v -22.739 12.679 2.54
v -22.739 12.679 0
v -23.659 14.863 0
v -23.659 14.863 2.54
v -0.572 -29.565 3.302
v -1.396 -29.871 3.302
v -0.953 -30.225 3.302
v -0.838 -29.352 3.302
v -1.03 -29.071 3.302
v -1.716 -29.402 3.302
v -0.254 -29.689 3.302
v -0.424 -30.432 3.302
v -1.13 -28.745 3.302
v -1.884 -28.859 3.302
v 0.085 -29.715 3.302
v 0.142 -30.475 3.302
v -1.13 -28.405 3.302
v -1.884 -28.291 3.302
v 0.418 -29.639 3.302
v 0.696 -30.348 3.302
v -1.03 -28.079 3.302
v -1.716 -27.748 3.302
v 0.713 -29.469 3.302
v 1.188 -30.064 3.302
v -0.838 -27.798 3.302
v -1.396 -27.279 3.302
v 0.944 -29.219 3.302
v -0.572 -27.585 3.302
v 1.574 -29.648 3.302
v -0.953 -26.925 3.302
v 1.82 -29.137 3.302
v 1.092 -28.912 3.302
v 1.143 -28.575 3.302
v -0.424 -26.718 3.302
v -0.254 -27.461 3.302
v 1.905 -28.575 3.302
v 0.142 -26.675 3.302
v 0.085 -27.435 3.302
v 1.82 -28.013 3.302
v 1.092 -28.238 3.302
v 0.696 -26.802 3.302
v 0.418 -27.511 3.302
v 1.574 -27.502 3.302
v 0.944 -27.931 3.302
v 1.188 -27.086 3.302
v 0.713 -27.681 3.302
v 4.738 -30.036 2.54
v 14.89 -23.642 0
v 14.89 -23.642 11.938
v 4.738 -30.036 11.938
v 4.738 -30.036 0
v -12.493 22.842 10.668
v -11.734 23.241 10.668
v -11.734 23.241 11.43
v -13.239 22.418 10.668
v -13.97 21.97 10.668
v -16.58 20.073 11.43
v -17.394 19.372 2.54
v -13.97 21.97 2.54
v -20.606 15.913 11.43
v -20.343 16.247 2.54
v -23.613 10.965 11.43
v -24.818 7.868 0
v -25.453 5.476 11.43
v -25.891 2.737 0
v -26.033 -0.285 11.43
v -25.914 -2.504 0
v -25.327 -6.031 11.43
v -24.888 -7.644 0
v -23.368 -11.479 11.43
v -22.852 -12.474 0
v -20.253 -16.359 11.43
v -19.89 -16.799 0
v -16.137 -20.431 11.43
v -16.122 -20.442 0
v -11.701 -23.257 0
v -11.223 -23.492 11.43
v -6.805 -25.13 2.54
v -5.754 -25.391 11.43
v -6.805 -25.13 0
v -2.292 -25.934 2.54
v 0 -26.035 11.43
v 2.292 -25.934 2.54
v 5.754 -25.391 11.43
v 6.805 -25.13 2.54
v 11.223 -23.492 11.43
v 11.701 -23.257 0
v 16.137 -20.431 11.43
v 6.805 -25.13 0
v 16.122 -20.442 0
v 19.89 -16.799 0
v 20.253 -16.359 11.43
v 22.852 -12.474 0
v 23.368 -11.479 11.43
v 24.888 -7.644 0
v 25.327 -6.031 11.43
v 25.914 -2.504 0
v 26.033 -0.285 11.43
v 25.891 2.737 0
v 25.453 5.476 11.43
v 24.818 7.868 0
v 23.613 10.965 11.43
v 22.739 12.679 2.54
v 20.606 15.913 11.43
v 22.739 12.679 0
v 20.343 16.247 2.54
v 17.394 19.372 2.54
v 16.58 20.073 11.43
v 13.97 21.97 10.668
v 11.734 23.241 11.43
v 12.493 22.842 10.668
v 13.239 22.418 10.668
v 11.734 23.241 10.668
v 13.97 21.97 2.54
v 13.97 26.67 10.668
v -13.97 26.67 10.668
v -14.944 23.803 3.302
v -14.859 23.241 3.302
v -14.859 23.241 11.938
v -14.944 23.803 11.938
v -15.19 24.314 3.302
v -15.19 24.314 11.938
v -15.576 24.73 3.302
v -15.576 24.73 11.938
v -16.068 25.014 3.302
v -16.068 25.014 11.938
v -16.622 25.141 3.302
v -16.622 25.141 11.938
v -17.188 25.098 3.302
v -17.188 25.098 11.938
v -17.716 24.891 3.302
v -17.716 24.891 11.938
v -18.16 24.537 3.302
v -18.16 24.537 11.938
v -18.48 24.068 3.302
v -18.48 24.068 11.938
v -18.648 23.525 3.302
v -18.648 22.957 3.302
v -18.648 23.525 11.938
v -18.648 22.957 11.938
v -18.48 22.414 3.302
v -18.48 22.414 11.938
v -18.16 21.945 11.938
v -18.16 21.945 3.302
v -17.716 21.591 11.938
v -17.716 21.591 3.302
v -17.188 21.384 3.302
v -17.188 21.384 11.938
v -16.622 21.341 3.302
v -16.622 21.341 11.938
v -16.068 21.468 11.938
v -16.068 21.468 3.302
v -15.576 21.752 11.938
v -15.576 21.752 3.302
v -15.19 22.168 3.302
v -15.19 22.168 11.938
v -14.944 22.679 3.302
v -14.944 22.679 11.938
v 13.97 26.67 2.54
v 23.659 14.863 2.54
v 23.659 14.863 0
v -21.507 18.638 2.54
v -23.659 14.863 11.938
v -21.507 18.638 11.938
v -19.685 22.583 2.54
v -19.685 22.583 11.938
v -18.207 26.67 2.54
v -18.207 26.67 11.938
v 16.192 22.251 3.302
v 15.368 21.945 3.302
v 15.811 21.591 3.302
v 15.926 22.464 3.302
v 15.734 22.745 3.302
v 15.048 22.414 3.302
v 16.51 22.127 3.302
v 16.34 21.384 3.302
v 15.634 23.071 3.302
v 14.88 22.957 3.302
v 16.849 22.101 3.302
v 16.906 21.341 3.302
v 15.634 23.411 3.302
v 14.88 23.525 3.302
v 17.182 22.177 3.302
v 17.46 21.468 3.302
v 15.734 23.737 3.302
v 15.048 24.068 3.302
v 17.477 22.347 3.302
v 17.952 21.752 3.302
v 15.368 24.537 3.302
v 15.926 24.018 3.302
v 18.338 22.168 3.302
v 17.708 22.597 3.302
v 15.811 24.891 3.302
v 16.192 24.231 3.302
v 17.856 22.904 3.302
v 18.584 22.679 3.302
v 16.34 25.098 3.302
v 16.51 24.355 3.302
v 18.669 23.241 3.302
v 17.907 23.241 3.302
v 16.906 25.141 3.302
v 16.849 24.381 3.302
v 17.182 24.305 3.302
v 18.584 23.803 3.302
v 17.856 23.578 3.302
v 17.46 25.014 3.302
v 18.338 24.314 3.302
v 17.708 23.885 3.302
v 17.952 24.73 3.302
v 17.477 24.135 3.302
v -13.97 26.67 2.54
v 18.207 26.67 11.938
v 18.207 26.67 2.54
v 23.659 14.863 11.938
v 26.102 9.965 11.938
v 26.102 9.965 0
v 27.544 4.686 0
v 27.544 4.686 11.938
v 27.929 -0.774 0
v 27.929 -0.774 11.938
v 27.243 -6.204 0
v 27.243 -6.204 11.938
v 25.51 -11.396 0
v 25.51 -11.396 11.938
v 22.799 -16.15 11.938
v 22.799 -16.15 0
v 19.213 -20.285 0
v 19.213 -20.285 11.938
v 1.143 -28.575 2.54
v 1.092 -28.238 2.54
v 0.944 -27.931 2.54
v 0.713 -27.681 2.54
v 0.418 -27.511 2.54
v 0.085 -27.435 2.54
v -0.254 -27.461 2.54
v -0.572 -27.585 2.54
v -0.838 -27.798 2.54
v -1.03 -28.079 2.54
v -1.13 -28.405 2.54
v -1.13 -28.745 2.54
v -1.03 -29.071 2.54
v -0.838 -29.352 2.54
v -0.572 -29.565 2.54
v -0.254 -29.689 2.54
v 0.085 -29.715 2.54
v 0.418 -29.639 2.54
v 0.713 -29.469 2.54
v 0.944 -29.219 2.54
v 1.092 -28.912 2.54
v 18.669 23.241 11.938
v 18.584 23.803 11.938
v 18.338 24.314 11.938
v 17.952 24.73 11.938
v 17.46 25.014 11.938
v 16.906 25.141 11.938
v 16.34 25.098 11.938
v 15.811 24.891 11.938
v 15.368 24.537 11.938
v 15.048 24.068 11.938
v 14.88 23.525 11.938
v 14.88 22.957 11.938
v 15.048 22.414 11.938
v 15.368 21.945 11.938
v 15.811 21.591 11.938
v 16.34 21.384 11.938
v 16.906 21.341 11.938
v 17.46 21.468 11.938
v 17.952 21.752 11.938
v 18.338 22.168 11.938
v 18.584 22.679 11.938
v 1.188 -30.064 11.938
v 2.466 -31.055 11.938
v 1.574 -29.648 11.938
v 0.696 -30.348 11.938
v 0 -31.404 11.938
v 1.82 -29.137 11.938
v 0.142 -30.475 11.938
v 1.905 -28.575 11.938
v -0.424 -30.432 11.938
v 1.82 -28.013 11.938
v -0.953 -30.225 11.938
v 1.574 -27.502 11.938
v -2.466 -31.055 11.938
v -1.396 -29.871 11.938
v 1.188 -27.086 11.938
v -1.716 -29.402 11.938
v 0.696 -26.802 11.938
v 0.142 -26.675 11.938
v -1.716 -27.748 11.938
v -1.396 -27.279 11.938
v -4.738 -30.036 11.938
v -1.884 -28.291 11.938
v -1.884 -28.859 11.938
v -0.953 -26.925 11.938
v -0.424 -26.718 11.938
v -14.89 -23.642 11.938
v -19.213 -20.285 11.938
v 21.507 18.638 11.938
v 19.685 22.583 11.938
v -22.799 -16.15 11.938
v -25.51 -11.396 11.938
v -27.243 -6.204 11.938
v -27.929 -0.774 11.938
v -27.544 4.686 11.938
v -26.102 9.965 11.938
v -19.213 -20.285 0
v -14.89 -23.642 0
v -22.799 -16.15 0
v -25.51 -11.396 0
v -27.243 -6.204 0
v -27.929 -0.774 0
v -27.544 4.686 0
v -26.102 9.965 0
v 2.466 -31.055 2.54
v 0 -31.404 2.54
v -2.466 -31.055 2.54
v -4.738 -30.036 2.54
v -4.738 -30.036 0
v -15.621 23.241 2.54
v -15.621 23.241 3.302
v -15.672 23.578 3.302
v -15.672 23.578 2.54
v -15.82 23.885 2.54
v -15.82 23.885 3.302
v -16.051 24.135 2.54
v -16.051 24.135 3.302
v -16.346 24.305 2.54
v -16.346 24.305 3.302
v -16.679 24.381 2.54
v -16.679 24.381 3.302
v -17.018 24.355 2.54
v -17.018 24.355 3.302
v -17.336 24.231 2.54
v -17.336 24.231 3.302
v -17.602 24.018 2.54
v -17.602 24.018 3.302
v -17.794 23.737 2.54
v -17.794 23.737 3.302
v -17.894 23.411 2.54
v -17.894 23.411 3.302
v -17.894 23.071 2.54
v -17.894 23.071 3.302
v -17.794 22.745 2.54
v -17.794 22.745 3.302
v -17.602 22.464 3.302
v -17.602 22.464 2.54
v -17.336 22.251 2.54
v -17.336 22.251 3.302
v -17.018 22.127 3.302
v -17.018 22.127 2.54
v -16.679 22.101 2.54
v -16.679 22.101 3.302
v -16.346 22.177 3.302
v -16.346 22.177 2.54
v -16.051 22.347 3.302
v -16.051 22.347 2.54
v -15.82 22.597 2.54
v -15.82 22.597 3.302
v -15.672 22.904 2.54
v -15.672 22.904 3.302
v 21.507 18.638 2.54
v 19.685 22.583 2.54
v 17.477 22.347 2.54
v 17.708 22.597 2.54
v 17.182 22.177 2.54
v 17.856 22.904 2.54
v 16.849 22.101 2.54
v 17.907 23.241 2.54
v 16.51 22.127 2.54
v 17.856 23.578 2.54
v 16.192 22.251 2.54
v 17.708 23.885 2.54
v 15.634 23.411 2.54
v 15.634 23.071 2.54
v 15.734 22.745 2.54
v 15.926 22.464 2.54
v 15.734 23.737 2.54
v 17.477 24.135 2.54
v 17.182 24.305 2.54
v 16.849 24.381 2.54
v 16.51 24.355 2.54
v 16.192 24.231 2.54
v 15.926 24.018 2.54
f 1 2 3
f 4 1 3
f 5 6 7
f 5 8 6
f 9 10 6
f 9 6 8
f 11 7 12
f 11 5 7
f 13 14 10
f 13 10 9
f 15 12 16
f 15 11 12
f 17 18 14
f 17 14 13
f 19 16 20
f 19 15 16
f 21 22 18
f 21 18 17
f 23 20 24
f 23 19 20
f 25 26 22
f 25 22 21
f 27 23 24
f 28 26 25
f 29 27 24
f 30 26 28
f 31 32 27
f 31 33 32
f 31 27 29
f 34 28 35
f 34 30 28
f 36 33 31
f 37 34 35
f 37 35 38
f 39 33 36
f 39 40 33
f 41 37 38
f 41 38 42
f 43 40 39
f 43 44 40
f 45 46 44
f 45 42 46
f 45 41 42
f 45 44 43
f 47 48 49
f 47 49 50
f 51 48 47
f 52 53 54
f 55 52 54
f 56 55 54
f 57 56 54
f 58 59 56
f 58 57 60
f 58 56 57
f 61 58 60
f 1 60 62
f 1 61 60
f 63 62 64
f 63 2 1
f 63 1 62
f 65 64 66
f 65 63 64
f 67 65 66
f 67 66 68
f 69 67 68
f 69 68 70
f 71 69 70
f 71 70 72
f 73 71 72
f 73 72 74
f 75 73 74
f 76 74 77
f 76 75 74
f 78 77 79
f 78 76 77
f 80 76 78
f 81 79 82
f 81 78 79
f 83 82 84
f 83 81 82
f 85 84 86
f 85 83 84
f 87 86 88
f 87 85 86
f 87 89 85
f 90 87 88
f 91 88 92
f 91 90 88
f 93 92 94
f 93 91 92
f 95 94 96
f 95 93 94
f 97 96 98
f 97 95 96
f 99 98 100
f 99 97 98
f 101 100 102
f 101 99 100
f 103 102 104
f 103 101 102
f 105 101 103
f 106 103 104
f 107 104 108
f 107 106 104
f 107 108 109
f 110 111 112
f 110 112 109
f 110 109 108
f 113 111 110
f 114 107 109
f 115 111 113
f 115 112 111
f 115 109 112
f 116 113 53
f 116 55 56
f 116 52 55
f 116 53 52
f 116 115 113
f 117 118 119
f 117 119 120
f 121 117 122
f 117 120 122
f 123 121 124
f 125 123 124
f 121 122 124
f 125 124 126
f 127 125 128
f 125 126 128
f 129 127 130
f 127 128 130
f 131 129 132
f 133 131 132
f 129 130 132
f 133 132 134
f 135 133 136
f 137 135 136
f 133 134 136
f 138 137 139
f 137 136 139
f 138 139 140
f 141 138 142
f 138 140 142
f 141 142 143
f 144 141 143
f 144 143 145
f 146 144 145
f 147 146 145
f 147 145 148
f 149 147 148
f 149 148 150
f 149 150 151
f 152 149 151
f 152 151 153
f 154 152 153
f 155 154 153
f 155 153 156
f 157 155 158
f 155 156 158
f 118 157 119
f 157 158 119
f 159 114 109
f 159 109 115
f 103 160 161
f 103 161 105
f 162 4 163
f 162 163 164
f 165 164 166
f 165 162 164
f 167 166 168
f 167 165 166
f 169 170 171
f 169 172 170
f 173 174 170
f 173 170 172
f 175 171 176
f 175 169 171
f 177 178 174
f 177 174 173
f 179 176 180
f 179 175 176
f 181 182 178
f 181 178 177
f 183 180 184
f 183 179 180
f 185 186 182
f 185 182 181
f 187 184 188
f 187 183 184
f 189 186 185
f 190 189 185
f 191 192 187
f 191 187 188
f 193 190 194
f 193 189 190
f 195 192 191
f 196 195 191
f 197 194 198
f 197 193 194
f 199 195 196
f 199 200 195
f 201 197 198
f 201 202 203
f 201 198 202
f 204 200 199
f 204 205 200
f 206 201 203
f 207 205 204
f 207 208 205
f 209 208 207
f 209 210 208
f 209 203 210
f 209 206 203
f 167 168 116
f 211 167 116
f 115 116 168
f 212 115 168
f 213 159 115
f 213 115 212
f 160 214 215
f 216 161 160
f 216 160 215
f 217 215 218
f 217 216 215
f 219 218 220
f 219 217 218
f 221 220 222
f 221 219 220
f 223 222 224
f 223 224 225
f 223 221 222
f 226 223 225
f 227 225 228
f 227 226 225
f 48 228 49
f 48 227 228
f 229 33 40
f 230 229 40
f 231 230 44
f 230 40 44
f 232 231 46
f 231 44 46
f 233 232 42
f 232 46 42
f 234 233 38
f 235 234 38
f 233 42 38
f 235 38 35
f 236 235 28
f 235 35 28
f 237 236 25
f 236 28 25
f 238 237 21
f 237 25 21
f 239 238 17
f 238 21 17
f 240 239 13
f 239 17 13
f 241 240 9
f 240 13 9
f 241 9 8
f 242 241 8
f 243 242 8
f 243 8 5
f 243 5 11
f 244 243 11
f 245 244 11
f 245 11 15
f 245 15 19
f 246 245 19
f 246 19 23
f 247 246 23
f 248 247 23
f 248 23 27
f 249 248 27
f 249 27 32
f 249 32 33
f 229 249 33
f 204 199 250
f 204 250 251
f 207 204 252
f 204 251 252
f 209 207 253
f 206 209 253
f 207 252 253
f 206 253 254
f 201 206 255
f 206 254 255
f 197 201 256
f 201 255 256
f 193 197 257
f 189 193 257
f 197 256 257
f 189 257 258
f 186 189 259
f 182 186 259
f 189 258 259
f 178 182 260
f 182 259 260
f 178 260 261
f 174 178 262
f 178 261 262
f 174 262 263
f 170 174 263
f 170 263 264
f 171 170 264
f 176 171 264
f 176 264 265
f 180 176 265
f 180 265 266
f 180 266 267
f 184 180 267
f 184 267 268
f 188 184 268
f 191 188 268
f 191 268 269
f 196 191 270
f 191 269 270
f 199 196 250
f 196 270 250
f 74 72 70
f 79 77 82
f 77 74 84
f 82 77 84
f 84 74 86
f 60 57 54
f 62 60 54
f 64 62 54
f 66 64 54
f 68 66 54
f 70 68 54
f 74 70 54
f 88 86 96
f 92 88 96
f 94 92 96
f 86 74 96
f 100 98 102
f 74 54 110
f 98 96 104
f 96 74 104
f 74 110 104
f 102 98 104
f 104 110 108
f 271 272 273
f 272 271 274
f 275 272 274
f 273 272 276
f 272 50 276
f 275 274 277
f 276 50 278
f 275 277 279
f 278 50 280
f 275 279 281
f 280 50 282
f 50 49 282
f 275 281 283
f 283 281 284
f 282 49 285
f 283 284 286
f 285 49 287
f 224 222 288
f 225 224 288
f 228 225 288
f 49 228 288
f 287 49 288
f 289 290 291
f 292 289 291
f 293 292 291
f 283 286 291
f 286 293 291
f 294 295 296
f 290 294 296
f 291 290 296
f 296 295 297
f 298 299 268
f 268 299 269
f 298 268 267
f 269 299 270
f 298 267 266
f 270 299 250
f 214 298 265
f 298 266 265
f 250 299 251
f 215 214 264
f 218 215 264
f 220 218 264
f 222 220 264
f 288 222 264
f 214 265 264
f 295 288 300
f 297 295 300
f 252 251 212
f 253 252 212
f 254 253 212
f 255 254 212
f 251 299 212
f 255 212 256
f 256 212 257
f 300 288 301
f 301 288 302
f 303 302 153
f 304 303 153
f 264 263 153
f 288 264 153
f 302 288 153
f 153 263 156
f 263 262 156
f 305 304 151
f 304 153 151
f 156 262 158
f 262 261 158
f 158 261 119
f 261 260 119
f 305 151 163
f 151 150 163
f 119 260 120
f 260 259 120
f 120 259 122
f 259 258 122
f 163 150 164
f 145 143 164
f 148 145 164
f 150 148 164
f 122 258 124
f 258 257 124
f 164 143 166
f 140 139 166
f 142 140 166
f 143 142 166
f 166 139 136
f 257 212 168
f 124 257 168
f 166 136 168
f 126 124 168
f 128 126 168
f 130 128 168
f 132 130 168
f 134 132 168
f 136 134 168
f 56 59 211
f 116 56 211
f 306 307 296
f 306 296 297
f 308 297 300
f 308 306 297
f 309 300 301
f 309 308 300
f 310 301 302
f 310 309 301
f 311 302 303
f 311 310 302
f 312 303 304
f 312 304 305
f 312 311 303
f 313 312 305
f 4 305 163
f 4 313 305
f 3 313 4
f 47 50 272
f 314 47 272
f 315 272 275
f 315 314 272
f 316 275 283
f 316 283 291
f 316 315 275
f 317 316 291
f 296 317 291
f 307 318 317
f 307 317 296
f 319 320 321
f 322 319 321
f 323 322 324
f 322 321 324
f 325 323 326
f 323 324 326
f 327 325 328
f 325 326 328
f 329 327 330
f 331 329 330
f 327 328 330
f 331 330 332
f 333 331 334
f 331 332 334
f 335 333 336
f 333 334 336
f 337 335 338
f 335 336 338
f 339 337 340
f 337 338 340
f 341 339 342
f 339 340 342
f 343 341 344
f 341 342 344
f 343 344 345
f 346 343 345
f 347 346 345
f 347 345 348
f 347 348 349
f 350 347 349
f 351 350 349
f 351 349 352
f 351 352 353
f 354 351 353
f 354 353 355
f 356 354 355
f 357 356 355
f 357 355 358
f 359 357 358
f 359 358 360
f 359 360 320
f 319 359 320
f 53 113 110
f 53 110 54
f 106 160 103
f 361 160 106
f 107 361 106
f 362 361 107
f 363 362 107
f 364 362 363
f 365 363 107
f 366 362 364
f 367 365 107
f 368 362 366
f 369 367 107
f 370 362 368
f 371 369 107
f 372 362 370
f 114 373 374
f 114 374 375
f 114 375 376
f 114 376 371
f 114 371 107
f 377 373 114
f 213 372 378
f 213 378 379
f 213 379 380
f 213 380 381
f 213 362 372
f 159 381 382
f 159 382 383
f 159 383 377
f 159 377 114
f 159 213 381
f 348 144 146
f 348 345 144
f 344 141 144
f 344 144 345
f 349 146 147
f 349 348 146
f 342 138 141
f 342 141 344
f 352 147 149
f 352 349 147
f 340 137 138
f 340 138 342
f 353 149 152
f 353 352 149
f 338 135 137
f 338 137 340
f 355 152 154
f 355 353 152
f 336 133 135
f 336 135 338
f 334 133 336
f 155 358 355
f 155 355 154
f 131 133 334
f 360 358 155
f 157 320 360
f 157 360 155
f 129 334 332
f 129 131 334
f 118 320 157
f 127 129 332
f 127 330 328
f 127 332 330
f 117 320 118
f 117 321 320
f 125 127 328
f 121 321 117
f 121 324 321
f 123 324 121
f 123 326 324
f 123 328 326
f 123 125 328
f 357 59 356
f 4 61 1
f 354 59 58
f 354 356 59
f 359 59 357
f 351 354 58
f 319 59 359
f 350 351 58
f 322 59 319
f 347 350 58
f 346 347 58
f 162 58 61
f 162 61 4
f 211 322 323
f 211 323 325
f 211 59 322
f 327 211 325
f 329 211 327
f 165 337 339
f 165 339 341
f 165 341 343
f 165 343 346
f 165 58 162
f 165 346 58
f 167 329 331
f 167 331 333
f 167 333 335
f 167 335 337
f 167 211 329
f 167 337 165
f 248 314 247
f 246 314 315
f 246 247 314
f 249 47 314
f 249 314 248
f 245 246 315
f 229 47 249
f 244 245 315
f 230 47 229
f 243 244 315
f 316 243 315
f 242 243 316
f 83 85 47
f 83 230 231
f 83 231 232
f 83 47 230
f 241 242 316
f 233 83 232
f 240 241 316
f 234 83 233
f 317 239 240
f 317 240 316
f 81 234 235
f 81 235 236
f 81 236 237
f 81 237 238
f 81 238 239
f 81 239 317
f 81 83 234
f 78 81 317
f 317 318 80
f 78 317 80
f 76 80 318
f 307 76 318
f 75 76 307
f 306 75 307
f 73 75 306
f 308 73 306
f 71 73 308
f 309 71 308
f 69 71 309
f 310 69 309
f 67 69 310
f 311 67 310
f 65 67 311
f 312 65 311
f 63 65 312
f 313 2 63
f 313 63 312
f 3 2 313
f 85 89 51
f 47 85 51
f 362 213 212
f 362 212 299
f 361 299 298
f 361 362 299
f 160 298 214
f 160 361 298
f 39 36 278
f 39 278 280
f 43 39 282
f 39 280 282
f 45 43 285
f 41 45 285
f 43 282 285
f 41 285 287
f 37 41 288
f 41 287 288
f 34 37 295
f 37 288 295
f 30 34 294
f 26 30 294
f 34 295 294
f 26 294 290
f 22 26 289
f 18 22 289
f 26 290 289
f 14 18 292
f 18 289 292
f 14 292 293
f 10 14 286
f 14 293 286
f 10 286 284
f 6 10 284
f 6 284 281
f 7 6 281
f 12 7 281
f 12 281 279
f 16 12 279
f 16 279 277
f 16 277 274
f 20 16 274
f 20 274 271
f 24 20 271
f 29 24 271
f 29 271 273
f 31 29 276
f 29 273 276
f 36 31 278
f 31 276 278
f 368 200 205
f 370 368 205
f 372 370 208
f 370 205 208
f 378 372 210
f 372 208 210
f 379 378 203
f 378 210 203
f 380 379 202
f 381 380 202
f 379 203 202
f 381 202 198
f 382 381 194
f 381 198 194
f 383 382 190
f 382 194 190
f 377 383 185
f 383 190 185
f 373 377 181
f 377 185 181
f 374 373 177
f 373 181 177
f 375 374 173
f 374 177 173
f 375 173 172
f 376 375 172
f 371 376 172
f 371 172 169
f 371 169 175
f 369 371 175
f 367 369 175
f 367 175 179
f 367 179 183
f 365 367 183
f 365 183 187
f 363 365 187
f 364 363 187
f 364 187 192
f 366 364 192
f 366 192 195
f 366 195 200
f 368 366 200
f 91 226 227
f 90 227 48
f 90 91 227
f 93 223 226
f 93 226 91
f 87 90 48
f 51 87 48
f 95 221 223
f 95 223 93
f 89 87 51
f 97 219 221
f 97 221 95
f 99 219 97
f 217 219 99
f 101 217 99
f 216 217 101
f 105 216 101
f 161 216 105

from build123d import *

# Parameters (mm, degrees)
BOSS_EXTRUDE1_DEPTH = 11.938
CUT_EXTRUDE1_DEPTH  = 11.43
SKETCH3_W           = 27.94
SKETCH3_H           = 25.845942769
CUT_EXTRUDE2_DEPTH  = 10.668
SKETCH4_R           = 1.905
CUT_EXTRUDE3_DEPTH  = 8.636
SKETCH5_R           = 1.143
CUT_EXTRUDE4_DEPTH  = 21.59
CUT_EXTRUDE5_DEPTH  = 2.54


with BuildPart() as part:
    # Sketch1 → Boss-Extrude1 (new body)
    with BuildSketch(Plane.XY):
        with BuildLine():
            Line((-4.737825132, -30.035944056), (-14.890307558, -23.641538462))
            ThreePointArc((-14.890307558, -23.641538462), (-27.242520167, -6.203925768), (-23.658870968, 14.862752926))
            ThreePointArc((-23.658870968, 14.862752926), (-20.55370118, 20.591203739), (-18.20732863, 26.67))
            Line((-18.20732863, 26.67), (18.20732863, 26.67))
            ThreePointArc((18.20732863, 26.67), (20.55370118, 20.591203739), (23.658870968, 14.862752926))
            ThreePointArc((23.658870968, 14.862752926), (27.242520167, -6.203925768), (14.890307558, -23.641538462))
            Line((14.890307558, -23.641538462), (4.737825132, -30.035944056))
            ThreePointArc((4.737825132, -30.035944056), (0, -31.403636364), (-4.737825132, -30.035944056))
        make_face()
    extrude(amount=BOSS_EXTRUDE1_DEPTH)

    # Sketch2 → Cut-Extrude1 (cut)
    with BuildSketch(Plane(origin=(0, 0, 0), x_dir=(-1, 0, 0), z_dir=(0, 0, -1))):
        with BuildLine():
            Line((-11.733590414, 23.241), (11.733590414, 23.241))
            ThreePointArc((11.733590414, 23.241), (0, -26.035), (-11.733590414, 23.241))
        make_face()
    extrude(amount=-CUT_EXTRUDE1_DEPTH, mode=Mode.SUBTRACT)

    # Sketch3 → Cut-Extrude2 (cut)
    with BuildSketch(Plane(origin=(0, 0, 0), x_dir=(-1, 0, 0), z_dir=(0, 0, -1))):
        with Locations((0, 24.280777857)):
            Rectangle(SKETCH3_W, SKETCH3_H)
    extrude(amount=-CUT_EXTRUDE2_DEPTH, mode=Mode.SUBTRACT)

    # Sketch4 → Cut-Extrude3 (cut)
    with BuildSketch(Plane.XY.offset(11.938)):
        with Locations((0, -28.575)):
            Circle(SKETCH4_R)
        with Locations((-16.764, 23.241)):
            Circle(SKETCH4_R)
        with Locations((16.764, 23.241)):
            Circle(SKETCH4_R)
    extrude(amount=-CUT_EXTRUDE3_DEPTH, mode=Mode.SUBTRACT)

    # Sketch5 → Cut-Extrude4 (cut)
    with BuildSketch(Plane.XY.offset(3.302)):
        with Locations((-16.764, 23.241)):
            Circle(SKETCH5_R)
        with Locations((16.764, 23.241)):
            Circle(SKETCH5_R)
        with Locations((0, -28.575)):
            Circle(SKETCH5_R)
    extrude(amount=-CUT_EXTRUDE4_DEPTH, mode=Mode.SUBTRACT)

    # Sketch6 → Cut-Extrude5 (cut)
    with BuildSketch(Plane(origin=(0, 0, 0), x_dir=(-1, 0, 0), z_dir=(0, 0, -1))):
        with BuildLine():
            Line((-23.658870968, 14.862752926), (-4.737825132, -30.035944056))
            ThreePointArc((-4.737825132, -30.035944056), (0, -31.403636364), (4.737825132, -30.035944056))
            Line((4.737825132, -30.035944056), (23.658870968, 14.862752926))
            ThreePointArc((23.658870968, 14.862752926), (20.55370118, 20.591203739), (18.20732863, 26.67))
            Line((18.20732863, 26.67), (-18.20732863, 26.67))
            ThreePointArc((-18.20732863, 26.67), (-20.55370118, 20.591203739), (-23.658870968, 14.862752926))
        make_face()
    extrude(amount=-CUT_EXTRUDE5_DEPTH, mode=Mode.SUBTRACT)


solid = part.part
